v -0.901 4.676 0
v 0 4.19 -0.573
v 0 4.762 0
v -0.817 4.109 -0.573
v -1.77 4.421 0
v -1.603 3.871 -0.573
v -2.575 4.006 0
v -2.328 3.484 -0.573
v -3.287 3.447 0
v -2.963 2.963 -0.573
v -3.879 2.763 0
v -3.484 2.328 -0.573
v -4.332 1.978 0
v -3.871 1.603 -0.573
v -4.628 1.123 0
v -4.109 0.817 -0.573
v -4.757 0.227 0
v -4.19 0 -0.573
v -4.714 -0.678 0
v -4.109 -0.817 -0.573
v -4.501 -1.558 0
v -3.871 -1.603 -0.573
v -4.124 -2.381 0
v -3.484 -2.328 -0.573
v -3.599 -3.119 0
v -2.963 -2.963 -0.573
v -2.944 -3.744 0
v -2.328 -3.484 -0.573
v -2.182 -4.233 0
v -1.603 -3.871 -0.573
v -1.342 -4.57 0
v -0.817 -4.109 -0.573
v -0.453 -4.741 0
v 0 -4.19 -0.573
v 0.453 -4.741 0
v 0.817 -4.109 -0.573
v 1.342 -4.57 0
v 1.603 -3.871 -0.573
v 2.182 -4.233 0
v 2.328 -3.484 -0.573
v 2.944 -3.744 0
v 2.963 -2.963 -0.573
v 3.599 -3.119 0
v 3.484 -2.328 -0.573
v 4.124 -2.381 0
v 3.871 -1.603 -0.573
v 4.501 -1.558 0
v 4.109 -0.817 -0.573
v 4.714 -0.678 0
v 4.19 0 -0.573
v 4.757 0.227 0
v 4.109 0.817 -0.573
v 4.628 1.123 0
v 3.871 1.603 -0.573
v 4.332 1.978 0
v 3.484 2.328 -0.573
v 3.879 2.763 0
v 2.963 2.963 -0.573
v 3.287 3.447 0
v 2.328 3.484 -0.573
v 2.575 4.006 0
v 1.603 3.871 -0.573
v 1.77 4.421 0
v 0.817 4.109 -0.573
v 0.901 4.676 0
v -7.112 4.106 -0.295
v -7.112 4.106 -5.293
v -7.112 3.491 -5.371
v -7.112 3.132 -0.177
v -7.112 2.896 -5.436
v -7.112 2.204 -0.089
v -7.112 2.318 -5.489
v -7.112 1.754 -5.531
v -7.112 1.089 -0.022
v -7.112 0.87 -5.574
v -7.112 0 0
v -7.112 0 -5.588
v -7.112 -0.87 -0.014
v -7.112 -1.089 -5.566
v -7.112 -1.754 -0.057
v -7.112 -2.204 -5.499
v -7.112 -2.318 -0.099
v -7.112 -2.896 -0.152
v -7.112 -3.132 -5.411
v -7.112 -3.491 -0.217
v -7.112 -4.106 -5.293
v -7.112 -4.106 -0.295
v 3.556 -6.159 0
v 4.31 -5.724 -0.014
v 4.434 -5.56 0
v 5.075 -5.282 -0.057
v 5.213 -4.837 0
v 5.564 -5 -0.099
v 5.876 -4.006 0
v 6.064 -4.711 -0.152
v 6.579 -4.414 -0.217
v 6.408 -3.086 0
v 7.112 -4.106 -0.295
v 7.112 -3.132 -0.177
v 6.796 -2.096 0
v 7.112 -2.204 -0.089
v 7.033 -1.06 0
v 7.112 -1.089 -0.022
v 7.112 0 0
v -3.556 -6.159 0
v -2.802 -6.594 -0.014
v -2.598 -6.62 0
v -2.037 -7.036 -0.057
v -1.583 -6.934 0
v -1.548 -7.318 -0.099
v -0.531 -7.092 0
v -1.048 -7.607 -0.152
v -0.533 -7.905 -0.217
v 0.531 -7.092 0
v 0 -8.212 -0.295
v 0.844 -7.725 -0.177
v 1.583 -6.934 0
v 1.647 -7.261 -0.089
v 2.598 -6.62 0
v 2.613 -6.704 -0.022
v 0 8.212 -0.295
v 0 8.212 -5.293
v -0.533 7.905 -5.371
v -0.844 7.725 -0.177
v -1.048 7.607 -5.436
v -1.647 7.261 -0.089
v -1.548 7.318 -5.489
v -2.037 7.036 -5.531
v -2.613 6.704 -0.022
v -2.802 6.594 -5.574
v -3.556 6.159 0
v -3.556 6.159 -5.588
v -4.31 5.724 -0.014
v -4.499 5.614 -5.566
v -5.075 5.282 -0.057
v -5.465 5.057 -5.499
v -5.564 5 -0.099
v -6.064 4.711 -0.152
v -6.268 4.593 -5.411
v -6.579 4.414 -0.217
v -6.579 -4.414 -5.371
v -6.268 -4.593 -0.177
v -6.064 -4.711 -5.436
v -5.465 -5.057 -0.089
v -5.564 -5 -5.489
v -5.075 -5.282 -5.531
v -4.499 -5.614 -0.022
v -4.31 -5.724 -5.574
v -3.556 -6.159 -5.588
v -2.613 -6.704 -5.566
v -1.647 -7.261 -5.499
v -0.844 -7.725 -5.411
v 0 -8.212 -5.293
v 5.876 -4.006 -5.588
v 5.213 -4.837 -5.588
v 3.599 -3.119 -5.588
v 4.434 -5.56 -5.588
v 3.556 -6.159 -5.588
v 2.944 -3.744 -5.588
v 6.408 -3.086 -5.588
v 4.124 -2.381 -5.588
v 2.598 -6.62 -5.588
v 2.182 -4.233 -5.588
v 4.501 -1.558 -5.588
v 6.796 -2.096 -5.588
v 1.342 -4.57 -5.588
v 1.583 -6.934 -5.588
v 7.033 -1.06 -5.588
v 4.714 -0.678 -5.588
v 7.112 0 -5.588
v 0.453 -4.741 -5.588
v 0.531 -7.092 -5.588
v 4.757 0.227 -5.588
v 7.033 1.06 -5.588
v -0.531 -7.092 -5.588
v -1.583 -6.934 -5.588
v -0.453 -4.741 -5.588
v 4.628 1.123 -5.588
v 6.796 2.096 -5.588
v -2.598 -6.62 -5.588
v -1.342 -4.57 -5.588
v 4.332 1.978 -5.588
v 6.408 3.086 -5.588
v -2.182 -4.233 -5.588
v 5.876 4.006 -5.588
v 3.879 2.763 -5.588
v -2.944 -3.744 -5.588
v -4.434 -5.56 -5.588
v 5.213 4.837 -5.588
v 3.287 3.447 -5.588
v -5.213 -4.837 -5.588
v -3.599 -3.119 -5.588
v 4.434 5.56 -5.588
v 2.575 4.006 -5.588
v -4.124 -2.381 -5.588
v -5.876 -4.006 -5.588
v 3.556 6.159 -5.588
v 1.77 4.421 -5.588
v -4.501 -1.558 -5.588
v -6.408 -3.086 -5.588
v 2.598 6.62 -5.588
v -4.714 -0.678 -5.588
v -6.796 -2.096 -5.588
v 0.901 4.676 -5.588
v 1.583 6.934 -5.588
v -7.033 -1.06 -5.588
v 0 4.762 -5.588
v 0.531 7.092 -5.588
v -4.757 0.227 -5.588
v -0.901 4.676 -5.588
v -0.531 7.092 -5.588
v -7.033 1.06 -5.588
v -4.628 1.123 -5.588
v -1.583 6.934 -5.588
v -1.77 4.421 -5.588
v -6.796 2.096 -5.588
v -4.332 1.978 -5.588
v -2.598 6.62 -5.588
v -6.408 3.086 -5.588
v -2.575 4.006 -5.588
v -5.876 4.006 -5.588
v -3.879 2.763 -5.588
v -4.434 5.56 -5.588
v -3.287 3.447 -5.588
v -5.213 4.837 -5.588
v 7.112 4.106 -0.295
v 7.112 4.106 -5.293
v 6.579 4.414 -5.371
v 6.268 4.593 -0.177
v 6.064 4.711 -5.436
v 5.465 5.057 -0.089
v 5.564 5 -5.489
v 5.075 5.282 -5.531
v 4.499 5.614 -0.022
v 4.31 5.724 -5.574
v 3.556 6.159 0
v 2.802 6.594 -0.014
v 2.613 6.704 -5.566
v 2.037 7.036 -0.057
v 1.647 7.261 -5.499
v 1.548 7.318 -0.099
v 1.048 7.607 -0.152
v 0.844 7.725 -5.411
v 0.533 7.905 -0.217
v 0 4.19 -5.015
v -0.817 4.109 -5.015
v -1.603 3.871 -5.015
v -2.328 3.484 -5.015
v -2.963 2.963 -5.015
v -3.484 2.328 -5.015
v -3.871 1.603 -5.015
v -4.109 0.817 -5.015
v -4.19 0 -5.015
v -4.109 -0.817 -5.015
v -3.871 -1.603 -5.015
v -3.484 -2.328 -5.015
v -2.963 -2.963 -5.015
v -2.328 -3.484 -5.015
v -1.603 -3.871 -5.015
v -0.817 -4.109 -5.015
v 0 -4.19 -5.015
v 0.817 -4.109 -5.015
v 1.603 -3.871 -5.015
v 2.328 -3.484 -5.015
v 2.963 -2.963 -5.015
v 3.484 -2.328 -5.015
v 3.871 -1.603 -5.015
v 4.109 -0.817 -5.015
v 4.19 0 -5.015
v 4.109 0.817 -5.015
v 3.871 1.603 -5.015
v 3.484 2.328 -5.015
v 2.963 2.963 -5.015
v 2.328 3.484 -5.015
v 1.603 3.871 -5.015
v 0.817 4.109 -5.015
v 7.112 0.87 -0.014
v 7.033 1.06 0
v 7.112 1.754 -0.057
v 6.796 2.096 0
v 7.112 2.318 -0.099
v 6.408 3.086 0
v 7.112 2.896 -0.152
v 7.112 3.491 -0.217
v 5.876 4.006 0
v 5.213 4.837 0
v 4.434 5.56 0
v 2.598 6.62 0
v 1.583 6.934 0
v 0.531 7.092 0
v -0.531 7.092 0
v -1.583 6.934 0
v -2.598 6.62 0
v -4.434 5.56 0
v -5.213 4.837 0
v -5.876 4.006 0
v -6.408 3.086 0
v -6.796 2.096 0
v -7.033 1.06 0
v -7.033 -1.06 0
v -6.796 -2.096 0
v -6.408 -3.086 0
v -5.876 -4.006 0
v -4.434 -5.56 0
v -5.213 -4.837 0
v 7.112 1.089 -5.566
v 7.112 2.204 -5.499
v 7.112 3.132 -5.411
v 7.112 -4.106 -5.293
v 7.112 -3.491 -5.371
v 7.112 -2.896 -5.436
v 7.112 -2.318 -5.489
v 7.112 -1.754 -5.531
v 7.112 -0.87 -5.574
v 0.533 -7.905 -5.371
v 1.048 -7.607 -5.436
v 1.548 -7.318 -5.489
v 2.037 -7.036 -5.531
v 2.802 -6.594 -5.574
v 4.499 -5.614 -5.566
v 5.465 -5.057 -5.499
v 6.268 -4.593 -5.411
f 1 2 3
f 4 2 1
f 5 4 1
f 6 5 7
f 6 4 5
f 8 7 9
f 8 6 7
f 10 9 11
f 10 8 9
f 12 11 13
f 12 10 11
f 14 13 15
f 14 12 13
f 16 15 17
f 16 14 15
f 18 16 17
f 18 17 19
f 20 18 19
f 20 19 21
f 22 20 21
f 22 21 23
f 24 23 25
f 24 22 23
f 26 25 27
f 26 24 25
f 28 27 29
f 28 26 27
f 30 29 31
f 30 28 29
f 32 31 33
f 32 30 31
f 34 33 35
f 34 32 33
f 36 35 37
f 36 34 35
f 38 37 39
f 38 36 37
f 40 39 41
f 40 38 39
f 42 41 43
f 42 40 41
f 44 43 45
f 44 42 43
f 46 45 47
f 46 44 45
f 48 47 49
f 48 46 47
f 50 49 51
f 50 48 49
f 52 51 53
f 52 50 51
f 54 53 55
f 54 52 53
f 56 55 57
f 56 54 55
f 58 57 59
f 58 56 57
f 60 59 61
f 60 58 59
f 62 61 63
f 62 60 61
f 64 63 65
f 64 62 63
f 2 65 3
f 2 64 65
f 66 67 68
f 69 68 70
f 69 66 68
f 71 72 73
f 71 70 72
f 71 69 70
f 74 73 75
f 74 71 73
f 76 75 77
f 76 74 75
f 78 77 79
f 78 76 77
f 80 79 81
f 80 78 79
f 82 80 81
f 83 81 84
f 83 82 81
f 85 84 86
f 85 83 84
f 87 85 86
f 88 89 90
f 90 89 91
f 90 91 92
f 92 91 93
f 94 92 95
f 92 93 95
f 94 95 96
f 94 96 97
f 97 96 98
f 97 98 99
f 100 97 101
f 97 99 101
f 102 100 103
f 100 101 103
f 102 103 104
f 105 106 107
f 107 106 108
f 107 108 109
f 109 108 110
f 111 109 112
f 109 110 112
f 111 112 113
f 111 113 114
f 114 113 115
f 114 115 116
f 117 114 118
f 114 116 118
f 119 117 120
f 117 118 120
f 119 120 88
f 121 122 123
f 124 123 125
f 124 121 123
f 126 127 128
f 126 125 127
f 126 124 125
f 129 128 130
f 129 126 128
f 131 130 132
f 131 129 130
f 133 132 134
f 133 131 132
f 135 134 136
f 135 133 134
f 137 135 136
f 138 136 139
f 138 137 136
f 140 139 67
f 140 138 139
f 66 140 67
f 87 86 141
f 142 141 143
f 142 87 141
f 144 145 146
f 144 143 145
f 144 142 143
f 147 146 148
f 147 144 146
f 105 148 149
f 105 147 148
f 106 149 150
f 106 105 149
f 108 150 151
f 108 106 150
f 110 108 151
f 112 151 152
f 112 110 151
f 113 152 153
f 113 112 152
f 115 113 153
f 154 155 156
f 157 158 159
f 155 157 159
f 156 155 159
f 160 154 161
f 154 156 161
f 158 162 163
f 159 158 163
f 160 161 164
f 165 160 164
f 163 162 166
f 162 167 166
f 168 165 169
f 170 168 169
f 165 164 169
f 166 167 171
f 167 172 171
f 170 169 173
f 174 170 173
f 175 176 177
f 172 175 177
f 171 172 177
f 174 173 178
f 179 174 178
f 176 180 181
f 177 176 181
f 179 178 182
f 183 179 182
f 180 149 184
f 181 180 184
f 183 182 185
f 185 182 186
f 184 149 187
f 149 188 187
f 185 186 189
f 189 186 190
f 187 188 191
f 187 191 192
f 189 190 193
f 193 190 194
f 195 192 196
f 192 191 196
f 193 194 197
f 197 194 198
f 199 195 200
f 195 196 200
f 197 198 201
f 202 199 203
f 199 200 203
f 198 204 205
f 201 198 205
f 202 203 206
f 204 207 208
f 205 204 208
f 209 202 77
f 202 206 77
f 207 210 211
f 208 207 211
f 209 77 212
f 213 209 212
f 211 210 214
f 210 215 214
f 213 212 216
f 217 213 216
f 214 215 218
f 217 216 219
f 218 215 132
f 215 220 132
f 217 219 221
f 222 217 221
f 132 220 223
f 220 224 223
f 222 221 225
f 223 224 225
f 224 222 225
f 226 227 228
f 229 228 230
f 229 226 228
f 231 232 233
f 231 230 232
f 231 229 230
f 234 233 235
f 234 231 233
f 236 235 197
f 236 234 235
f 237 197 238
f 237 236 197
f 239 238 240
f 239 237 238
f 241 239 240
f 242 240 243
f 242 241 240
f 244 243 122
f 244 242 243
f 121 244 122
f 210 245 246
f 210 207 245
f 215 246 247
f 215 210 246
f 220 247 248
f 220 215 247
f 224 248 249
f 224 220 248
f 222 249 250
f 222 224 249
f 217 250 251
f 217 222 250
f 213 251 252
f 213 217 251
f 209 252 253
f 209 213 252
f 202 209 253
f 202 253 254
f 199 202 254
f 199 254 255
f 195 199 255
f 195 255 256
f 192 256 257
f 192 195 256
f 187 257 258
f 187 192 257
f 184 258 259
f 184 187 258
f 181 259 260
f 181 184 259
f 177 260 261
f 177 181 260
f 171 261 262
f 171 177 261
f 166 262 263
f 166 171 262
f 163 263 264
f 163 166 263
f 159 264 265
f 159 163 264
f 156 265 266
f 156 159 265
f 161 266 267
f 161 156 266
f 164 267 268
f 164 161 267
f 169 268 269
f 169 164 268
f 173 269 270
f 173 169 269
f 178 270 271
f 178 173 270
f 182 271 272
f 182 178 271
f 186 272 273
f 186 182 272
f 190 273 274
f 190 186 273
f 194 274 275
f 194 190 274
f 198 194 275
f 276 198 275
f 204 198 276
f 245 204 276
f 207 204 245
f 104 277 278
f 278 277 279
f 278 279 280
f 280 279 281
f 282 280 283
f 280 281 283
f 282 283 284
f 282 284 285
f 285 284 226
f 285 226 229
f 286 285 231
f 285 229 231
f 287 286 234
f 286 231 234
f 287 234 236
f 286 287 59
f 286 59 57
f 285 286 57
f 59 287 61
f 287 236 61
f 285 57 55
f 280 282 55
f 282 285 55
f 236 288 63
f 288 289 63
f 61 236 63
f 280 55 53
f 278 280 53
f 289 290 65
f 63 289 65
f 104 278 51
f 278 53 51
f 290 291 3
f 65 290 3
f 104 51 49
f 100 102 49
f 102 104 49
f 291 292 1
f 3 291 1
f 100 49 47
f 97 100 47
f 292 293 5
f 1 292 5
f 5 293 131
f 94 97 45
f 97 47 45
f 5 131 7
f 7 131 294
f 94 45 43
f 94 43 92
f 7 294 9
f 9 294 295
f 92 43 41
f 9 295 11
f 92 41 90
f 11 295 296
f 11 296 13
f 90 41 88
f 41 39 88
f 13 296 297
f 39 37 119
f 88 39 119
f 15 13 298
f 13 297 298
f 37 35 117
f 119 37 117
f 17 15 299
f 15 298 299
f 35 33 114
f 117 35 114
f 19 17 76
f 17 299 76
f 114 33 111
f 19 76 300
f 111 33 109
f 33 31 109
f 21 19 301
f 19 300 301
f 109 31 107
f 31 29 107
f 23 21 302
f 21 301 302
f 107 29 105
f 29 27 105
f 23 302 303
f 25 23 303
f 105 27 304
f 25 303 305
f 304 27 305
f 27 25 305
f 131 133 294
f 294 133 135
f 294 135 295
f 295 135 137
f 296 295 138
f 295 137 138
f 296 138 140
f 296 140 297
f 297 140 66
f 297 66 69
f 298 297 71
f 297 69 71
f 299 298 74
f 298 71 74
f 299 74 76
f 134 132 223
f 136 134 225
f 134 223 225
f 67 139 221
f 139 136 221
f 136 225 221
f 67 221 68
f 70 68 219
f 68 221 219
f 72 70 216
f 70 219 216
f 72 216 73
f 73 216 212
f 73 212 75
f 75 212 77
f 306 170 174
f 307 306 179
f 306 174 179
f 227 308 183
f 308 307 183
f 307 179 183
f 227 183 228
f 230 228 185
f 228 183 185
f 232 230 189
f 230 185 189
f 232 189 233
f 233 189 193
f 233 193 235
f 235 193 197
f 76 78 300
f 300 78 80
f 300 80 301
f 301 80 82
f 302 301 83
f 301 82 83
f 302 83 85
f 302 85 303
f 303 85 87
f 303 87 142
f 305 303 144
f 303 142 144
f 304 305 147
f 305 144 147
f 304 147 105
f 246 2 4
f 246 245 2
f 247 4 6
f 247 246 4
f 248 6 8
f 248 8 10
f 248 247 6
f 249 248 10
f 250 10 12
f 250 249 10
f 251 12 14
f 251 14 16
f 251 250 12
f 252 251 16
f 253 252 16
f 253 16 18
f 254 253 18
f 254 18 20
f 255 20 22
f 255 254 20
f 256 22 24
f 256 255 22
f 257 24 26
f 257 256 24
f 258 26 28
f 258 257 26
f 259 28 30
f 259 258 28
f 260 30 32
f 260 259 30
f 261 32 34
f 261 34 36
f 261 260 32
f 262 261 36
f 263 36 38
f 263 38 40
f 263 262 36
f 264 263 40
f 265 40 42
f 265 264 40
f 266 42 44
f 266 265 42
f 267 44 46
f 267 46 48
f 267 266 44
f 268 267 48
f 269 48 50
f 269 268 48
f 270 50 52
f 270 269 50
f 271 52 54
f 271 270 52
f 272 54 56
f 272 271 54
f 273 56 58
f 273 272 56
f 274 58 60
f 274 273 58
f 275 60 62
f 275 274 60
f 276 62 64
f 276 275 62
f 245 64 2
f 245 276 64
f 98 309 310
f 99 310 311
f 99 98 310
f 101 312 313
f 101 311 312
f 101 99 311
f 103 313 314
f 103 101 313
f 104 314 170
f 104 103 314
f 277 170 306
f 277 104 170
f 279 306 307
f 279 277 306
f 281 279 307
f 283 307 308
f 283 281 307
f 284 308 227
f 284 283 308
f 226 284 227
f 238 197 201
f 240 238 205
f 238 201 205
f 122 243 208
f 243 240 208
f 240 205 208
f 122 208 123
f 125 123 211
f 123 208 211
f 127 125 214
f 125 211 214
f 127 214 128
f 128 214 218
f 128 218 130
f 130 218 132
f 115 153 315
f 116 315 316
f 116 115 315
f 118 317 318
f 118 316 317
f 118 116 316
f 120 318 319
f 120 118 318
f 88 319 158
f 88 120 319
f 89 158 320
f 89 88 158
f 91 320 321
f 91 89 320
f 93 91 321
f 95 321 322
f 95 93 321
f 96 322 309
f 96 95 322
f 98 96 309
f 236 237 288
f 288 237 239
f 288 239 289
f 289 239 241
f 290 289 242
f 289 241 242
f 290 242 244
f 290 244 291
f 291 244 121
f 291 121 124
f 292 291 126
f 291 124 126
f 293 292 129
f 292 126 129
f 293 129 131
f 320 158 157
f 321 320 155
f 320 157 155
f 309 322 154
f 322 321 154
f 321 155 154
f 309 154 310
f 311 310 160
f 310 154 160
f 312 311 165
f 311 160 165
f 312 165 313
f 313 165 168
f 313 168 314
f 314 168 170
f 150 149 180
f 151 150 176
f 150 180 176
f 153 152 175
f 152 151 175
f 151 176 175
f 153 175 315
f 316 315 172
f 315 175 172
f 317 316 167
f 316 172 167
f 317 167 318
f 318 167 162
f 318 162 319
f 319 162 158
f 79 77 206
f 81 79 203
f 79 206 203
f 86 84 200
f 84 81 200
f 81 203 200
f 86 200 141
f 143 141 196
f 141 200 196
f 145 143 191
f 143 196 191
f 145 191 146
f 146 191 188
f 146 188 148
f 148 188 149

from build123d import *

# Parameters (mm, degrees)
SKETCH2_W          = 28.448
SKETCH2_H          = 28.448
CUT_EXTRUDE1_DEPTH = 5.588


with BuildPart() as part:
    # Sketch1 → Revolve1 (revolve)
    with BuildSketch(Plane(origin=(0, 0, 0), x_dir=(0, 0, -1), z_dir=(1, 0, 0))):
        Polygon((0, 0), (0, 7.112), (0.381130931, 8.5344), (5.206869069, 8.5344), (5.588, 7.112), (5.588, 0), align=None)
    revolve(axis=Axis((0, 0, -5.588), (0, 0, 1)))

    # Sketch2 → Cut-Extrude1 (cut)
    with BuildSketch(Plane.XY):
        Rectangle(SKETCH2_W, SKETCH2_H)
        Polygon((-7.112, -4.106115114), (0, -8.212230229), (7.112, -4.106115114), (7.112, 4.106115114), (0, 8.212230229), (-7.112, 4.106115114), align=None, mode=Mode.SUBTRACT)
    extrude(amount=-CUT_EXTRUDE1_DEPTH, mode=Mode.SUBTRACT)

    # Sketch3 → Cut-Revolve1 (revolve, cut)
    with BuildSketch(Plane(origin=(0, 0, 0), x_dir=(0, 0, -1), z_dir=(1, 0, 0))):
        Polygon((0, 0), (0, 4.7625), (0.57277, 4.18973), (5.01523, 4.18973), (5.588, 4.7625), (5.588, 0), align=None)
    revolve(axis=Axis((0, 0, -5.588), (0, 0, 1)), mode=Mode.SUBTRACT)


solid = part.part
